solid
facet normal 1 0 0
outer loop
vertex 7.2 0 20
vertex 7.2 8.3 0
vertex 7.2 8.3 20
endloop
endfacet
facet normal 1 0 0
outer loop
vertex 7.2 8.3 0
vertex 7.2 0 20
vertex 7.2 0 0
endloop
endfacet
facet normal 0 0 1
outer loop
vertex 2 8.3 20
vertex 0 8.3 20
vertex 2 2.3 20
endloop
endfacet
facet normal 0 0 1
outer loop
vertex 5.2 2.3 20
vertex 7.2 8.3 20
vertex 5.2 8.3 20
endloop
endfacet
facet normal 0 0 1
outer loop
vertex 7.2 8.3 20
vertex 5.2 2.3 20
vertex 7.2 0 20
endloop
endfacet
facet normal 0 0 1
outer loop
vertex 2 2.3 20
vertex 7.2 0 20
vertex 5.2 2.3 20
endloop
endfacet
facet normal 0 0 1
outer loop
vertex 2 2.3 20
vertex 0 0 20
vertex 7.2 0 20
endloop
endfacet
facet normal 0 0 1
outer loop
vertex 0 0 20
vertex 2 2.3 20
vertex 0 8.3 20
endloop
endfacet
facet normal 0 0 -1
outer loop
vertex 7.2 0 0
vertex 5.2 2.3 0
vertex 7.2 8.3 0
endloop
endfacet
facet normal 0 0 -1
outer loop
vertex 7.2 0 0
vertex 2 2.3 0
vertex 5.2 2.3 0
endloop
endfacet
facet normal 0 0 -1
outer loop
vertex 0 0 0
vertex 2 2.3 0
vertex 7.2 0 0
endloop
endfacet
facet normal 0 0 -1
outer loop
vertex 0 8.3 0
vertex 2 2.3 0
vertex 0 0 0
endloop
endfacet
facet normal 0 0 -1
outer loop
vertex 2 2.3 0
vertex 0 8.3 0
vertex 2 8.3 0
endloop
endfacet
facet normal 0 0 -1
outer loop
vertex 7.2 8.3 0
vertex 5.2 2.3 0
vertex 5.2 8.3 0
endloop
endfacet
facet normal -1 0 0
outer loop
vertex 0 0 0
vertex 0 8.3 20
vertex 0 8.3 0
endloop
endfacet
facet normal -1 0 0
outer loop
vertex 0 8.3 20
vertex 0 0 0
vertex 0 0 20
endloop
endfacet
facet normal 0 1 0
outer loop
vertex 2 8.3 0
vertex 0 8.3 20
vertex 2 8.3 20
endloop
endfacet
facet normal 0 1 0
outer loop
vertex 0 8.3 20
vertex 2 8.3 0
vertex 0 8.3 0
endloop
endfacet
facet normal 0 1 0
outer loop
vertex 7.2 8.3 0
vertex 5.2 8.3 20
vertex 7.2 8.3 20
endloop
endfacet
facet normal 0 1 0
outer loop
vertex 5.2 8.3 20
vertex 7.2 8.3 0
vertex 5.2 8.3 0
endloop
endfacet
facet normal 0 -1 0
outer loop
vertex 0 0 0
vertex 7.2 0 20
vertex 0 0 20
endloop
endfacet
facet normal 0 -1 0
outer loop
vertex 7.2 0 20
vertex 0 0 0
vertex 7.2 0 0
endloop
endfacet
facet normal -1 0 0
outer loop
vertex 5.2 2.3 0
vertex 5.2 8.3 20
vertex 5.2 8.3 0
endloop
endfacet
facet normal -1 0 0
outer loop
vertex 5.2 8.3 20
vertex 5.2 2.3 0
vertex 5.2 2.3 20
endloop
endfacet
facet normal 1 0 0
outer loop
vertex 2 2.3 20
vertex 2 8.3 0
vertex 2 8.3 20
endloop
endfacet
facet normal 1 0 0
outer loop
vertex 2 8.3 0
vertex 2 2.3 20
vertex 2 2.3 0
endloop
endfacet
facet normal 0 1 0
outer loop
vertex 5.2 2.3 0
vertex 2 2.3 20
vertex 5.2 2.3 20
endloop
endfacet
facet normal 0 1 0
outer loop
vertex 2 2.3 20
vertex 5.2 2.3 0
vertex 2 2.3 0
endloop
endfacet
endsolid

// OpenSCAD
/*
 * Customizable spacer rear Y motor Holder to Nema 17 motor for Tatara steel frame V100 - https://www.thingiverse.com/thing:2730724
 * by TataraTeam - https://www.thingiverse.com/TataraTeam/about
 * created 2017-12-25
 * version v0.01
 *
 * Changelog
 * --------------
 * v0.01:
 *      - First version
 * --------------
 * 
 * This work is licensed under the Creative Commons - Attribution - NonCommercial - ShareAlike license.
 * https://creativecommons.org/licenses/by-nc-sa/3.0/
 */

//preview[view:north, tilt:top]

// Y rear bracket to NEMA 17 motor distance in mm
ytrb=2.3;
// 3D Printed part Wall thickness in mm
wt = 2; //[2:0.4:4]
// Material frame thickness in mm )
mt=3;
// Clearance in mm
clearance=0.2; 
/* [Hidden] */
ybmh=6;

difference() {
cube(size = [wt+mt+clearance+wt, ytrb+ybmh, 20], center = false);
translate([wt, ytrb ,0])
     cube(size = [mt+clearance, ybmh, 20], center = false);
}
